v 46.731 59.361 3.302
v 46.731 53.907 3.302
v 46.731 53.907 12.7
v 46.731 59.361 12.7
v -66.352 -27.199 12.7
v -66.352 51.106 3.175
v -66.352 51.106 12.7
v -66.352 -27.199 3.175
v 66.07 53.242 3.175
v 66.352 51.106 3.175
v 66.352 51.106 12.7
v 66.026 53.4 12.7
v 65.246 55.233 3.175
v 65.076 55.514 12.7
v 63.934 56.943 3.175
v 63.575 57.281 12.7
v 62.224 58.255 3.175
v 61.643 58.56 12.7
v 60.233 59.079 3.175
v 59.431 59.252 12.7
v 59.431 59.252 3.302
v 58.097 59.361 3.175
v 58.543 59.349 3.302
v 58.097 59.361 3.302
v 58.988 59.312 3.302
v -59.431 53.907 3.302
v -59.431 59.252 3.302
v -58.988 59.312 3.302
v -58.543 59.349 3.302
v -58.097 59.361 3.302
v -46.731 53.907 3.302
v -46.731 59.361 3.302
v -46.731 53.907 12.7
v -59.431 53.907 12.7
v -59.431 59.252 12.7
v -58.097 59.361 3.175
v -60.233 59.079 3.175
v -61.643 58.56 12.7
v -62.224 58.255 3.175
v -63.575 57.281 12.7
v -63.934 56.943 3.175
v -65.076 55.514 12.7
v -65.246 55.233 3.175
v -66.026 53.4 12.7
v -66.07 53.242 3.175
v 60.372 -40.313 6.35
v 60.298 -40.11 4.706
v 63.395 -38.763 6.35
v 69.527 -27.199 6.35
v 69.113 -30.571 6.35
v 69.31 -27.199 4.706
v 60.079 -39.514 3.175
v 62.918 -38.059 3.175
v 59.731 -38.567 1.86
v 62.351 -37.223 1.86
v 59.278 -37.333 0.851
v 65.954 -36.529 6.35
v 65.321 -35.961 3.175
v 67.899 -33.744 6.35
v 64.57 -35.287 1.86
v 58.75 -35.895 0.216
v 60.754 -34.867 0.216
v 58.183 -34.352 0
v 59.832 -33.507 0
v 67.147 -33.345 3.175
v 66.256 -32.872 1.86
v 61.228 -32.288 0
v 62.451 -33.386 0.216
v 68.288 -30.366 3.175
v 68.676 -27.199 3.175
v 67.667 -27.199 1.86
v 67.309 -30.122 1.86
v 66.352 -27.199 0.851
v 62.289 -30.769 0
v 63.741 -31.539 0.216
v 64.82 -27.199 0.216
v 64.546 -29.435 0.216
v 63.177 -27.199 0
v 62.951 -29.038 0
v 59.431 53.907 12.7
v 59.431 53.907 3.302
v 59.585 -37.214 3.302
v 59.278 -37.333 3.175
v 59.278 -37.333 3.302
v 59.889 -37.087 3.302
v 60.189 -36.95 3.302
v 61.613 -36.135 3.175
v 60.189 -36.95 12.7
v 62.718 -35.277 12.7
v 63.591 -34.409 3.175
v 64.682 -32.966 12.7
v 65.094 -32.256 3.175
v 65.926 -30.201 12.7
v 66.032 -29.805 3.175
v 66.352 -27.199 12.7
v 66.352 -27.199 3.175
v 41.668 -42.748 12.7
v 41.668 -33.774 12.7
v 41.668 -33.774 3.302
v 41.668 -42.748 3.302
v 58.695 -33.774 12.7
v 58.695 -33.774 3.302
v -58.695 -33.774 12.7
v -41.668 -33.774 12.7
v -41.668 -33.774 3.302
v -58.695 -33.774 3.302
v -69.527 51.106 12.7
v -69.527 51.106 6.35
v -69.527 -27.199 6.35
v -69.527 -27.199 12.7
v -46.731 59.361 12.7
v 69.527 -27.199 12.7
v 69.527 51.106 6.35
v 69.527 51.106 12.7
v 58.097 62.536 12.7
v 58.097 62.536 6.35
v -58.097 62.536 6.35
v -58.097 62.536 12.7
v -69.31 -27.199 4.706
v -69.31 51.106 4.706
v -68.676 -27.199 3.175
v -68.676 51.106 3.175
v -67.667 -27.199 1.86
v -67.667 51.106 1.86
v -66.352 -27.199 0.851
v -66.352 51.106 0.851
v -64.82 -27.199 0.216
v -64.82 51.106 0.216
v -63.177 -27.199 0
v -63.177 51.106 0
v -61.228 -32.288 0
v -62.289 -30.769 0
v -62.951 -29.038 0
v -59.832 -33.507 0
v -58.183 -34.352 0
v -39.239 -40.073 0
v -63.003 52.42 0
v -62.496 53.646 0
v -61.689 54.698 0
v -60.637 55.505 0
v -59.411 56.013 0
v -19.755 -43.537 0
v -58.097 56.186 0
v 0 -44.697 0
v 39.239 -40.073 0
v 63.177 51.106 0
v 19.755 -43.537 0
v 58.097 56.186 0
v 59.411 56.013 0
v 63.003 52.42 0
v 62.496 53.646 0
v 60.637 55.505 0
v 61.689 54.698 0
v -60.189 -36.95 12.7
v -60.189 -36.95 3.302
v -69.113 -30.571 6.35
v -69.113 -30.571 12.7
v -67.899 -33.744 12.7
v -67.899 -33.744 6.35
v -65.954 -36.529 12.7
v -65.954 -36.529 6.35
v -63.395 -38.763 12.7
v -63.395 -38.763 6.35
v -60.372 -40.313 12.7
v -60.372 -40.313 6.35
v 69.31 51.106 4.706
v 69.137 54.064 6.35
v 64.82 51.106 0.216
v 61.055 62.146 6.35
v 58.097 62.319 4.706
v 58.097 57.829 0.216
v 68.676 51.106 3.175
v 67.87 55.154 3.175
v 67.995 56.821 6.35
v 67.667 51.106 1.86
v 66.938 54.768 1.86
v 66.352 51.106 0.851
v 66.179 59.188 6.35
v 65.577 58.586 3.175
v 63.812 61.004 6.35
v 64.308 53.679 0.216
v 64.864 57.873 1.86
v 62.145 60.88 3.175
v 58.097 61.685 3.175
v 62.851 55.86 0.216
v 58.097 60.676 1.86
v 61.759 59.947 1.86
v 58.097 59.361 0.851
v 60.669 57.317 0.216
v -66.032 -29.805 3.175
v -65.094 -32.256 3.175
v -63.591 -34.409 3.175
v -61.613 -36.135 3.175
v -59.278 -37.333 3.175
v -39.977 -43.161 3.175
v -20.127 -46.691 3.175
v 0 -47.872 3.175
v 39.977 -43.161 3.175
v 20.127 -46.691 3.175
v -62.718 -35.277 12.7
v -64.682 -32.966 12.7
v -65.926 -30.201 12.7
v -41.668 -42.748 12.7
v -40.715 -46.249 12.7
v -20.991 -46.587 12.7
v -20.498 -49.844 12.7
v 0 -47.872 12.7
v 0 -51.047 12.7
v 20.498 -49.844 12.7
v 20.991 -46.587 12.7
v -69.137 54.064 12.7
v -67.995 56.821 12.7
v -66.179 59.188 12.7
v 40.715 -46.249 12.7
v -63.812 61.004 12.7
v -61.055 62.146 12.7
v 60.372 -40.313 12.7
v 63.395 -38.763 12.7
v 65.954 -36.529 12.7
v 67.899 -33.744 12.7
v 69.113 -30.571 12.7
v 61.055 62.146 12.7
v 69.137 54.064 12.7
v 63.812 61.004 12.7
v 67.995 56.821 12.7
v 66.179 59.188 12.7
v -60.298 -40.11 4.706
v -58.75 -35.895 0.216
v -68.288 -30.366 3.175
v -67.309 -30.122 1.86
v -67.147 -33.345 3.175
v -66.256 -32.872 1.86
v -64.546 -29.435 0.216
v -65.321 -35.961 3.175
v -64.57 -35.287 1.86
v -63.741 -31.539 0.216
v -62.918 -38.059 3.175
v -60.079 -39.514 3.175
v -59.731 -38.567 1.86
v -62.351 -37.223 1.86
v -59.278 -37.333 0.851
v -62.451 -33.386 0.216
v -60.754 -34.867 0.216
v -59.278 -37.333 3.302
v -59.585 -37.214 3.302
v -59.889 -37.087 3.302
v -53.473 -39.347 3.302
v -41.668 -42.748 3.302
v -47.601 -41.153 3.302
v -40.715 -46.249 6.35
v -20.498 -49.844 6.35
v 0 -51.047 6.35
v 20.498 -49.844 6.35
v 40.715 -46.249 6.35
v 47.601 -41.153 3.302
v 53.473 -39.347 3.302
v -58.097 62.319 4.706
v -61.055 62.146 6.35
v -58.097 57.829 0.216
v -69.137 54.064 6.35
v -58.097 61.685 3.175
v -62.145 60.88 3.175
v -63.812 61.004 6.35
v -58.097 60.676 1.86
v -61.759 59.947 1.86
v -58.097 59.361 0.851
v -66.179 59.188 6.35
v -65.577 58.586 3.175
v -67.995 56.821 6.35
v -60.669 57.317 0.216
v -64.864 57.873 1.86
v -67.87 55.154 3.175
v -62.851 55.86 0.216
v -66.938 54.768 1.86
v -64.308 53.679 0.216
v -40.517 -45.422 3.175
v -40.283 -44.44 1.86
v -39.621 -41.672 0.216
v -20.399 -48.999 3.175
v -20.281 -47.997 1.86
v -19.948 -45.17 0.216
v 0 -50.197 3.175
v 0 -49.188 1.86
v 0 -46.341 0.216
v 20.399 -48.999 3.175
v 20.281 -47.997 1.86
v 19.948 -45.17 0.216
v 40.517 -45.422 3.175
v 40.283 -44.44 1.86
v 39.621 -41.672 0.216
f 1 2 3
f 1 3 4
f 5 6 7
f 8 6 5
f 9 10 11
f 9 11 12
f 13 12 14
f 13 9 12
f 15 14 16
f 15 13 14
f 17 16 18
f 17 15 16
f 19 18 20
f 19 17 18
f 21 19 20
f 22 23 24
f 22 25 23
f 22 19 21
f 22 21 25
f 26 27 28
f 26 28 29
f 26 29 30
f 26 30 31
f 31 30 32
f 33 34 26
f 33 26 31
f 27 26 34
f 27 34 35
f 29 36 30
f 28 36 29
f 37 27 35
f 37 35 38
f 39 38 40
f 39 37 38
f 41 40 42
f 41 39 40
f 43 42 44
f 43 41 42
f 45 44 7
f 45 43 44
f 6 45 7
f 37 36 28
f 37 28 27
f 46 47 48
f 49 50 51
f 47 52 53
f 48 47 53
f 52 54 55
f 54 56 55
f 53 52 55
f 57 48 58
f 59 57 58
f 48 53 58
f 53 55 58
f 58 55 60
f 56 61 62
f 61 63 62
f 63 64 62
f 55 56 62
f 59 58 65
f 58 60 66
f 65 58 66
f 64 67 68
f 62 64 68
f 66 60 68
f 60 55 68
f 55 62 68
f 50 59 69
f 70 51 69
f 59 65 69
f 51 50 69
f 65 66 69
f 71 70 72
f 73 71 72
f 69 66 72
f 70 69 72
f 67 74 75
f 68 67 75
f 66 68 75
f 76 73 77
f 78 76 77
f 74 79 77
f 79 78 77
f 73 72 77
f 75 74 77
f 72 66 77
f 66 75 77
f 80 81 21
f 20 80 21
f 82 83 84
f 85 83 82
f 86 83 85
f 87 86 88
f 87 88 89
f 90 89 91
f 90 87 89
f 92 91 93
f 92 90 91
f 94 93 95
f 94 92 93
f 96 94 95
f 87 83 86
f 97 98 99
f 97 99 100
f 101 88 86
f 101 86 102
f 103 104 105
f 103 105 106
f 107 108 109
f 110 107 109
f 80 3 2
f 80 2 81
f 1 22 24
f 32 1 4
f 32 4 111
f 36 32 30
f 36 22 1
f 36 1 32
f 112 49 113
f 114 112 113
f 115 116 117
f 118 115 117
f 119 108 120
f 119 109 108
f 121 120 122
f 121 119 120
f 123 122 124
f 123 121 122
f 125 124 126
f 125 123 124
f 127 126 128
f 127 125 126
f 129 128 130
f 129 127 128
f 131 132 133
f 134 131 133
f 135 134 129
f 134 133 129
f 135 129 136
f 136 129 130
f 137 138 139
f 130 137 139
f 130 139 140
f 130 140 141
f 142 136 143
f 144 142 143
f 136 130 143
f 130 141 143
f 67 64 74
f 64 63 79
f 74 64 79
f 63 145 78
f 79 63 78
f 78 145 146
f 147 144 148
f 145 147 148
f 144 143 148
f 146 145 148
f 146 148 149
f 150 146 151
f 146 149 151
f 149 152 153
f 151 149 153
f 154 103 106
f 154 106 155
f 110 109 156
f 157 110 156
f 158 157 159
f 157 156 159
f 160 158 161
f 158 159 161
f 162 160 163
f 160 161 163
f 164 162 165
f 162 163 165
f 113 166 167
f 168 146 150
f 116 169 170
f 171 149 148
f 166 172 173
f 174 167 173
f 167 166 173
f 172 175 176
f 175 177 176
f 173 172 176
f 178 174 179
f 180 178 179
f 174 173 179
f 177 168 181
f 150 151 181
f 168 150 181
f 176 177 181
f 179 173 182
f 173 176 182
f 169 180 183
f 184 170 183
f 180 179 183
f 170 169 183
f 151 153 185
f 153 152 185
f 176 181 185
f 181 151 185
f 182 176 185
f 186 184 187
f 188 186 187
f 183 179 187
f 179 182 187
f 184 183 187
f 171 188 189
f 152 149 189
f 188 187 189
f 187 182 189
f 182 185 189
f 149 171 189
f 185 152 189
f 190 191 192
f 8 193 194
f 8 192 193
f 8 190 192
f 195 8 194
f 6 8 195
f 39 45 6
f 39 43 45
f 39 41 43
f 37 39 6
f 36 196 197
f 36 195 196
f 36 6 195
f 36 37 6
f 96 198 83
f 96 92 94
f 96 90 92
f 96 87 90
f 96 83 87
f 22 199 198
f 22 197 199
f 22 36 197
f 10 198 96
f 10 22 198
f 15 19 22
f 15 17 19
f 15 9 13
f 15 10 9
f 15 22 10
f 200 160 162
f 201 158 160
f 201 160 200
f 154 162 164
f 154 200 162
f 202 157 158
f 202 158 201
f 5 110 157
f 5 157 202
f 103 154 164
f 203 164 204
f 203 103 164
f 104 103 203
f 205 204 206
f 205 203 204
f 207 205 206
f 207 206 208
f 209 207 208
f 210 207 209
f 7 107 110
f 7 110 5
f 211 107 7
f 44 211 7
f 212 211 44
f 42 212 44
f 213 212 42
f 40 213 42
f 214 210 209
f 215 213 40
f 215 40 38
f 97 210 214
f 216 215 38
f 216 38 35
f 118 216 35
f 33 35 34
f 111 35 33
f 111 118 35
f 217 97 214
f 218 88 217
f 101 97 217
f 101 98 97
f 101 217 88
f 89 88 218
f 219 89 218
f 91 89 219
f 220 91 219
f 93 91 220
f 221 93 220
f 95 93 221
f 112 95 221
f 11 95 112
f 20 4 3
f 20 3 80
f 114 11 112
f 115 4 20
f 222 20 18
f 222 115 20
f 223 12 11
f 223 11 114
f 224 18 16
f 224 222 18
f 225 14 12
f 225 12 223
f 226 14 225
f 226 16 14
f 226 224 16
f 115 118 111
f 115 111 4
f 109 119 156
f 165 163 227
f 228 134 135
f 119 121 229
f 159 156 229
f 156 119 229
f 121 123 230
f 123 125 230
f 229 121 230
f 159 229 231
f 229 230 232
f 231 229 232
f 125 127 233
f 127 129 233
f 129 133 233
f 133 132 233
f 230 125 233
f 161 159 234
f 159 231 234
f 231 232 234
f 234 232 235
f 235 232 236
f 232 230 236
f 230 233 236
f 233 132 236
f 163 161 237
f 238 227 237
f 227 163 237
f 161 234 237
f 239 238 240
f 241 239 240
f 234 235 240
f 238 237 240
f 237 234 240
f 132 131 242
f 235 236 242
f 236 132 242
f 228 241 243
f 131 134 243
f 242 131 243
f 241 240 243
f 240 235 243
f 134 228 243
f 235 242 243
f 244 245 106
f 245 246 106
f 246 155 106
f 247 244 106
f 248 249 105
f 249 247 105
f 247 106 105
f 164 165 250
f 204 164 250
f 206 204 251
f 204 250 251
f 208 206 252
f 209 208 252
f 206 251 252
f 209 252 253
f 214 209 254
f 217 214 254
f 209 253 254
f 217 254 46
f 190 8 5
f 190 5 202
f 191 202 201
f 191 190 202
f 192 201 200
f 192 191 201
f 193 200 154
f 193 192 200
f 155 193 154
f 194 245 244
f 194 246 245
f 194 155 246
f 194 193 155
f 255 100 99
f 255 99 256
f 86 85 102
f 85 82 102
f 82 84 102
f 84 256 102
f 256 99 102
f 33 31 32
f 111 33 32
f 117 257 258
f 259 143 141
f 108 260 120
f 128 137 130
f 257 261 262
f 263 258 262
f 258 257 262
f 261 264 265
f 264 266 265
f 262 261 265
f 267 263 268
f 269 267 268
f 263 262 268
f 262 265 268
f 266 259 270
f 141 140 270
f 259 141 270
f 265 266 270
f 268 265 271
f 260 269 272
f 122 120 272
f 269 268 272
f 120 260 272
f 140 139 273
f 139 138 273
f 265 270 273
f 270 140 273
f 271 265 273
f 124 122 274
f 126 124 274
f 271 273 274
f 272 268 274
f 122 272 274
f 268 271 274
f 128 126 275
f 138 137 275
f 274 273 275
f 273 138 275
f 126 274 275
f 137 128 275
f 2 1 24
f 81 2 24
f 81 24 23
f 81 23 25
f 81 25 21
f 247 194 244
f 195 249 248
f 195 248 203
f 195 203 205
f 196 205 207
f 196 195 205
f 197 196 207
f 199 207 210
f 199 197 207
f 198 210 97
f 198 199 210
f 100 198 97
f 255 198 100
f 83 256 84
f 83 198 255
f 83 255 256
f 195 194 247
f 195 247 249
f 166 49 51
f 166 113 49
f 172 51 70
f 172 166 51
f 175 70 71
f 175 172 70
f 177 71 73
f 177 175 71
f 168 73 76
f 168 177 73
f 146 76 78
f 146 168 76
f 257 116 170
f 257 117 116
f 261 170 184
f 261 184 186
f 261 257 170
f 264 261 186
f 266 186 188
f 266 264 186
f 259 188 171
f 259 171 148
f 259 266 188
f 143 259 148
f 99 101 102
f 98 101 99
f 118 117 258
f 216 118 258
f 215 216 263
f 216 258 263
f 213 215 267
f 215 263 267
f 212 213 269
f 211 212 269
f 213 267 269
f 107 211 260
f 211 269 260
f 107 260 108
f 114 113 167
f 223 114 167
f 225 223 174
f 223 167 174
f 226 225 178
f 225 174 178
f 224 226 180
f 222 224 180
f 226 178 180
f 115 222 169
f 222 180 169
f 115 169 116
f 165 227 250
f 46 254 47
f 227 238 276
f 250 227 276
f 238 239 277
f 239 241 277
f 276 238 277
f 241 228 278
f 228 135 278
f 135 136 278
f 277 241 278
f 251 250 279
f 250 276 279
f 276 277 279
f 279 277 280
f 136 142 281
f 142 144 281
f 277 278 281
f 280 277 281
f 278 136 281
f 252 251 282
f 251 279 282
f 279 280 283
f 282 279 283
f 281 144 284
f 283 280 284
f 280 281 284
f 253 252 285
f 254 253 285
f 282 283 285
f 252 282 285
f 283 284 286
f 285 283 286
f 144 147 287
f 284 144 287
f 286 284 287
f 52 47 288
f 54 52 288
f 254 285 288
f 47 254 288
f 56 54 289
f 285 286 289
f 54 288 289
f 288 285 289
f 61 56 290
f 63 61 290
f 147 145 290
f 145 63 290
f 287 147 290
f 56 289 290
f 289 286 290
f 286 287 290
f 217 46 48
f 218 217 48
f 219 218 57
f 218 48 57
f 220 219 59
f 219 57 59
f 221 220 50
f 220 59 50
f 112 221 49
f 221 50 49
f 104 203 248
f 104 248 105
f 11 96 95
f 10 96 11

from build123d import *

# Parameters (mm, degrees)
F1_DEPTH = 12.7
F2_T     = -3.175
F3_R     = 6.35
F5_W     = 12.7
F5_H     = 6.35
F6_DEPTH = 9.398


# Not quite as in the source:
# - a feature names something its author has since deleted; it is built from what else it names


with BuildPart() as f1:
    # F0 (on Top) → F1 (new body)
    with BuildSketch(Plane.XY):
        with BuildLine():
            Line((58.0965084505, 62.5356453779), (-58.0965084505, 62.5356453779))
            ThreePointArc((-58.0965084505, 62.5356453779), (-66.1787389595, 59.1878758868), (-69.5265084505, 51.1056453779))
            Line((-69.5265084505, 51.1056453779), (-69.5265084505, -27.1992570698))
            ThreePointArc((-69.5265084505, -27.1992570698), (-67.0115325937, -35.1957139026), (-60.3721316603, -40.3130159932))
            ThreePointArc((-60.3721316603, -40.3130159932), (0, -51.0474727306), (60.3721316603, -40.3130159932))
            ThreePointArc((60.3721316603, -40.3130159932), (67.0115325937, -35.1957139026), (69.5265084505, -27.1992570698))
            Line((69.5265084505, -27.1992570698), (69.5265084505, 51.1056453779))
            ThreePointArc((69.5265084505, 51.1056453779), (66.1787389595, 59.1878758868), (58.0965084505, 62.5356453779))
        make_face()
    extrude(amount=F1_DEPTH)

    # F2
    f2_openings = [f1.faces().sort_by_distance(p)[0] for p in [
        (0, 7.919531, 12.7),
    ]]
    offset(amount=F2_T, openings=f2_openings)

    # F3
    f3_edges = [f1.edges().sort_by_distance(p)[0] for p in [
        (69.526508, 11.953194, 0),
        (66.178739, 59.187876, 0),
        (0, 62.535645, 0),
        (-66.178739, 59.187876, 0),
        (-69.526508, 11.953194, 0),
        (-67.011533, -35.195714, 0),
        (0, -51.047473, 0),
        (67.011533, -35.195714, 0),
    ]]
    fillet(f3_edges, radius=F3_R)

    # F5 (on offset) → F6 (join)
    with BuildSketch(Plane.XY.offset(12.7)):
        with Locations((-53.0805146158, 57.0815077901)):
            Rectangle(F5_W, F5_H)
        with Locations((53.0805146158, 57.0815077901)):
            Rectangle(F5_W, F5_H)
        Polygon((-41.6677072644, -33.773638308), (-58.6946308613, -33.773638308), (-60.6418885291, -37.9110425711), (-53.9016760886, -40.266495198), (-41.6677072644, -43.4330925345), align=None)
        Polygon((60.6418885291, -37.9110425711), (58.6946308613, -33.773638308), (41.6677072644, -33.773638308), (41.6677072644, -43.4330925345), (53.9016760886, -40.266495198), align=None)
    extrude(amount=-F6_DEPTH)


solid = f1.part
